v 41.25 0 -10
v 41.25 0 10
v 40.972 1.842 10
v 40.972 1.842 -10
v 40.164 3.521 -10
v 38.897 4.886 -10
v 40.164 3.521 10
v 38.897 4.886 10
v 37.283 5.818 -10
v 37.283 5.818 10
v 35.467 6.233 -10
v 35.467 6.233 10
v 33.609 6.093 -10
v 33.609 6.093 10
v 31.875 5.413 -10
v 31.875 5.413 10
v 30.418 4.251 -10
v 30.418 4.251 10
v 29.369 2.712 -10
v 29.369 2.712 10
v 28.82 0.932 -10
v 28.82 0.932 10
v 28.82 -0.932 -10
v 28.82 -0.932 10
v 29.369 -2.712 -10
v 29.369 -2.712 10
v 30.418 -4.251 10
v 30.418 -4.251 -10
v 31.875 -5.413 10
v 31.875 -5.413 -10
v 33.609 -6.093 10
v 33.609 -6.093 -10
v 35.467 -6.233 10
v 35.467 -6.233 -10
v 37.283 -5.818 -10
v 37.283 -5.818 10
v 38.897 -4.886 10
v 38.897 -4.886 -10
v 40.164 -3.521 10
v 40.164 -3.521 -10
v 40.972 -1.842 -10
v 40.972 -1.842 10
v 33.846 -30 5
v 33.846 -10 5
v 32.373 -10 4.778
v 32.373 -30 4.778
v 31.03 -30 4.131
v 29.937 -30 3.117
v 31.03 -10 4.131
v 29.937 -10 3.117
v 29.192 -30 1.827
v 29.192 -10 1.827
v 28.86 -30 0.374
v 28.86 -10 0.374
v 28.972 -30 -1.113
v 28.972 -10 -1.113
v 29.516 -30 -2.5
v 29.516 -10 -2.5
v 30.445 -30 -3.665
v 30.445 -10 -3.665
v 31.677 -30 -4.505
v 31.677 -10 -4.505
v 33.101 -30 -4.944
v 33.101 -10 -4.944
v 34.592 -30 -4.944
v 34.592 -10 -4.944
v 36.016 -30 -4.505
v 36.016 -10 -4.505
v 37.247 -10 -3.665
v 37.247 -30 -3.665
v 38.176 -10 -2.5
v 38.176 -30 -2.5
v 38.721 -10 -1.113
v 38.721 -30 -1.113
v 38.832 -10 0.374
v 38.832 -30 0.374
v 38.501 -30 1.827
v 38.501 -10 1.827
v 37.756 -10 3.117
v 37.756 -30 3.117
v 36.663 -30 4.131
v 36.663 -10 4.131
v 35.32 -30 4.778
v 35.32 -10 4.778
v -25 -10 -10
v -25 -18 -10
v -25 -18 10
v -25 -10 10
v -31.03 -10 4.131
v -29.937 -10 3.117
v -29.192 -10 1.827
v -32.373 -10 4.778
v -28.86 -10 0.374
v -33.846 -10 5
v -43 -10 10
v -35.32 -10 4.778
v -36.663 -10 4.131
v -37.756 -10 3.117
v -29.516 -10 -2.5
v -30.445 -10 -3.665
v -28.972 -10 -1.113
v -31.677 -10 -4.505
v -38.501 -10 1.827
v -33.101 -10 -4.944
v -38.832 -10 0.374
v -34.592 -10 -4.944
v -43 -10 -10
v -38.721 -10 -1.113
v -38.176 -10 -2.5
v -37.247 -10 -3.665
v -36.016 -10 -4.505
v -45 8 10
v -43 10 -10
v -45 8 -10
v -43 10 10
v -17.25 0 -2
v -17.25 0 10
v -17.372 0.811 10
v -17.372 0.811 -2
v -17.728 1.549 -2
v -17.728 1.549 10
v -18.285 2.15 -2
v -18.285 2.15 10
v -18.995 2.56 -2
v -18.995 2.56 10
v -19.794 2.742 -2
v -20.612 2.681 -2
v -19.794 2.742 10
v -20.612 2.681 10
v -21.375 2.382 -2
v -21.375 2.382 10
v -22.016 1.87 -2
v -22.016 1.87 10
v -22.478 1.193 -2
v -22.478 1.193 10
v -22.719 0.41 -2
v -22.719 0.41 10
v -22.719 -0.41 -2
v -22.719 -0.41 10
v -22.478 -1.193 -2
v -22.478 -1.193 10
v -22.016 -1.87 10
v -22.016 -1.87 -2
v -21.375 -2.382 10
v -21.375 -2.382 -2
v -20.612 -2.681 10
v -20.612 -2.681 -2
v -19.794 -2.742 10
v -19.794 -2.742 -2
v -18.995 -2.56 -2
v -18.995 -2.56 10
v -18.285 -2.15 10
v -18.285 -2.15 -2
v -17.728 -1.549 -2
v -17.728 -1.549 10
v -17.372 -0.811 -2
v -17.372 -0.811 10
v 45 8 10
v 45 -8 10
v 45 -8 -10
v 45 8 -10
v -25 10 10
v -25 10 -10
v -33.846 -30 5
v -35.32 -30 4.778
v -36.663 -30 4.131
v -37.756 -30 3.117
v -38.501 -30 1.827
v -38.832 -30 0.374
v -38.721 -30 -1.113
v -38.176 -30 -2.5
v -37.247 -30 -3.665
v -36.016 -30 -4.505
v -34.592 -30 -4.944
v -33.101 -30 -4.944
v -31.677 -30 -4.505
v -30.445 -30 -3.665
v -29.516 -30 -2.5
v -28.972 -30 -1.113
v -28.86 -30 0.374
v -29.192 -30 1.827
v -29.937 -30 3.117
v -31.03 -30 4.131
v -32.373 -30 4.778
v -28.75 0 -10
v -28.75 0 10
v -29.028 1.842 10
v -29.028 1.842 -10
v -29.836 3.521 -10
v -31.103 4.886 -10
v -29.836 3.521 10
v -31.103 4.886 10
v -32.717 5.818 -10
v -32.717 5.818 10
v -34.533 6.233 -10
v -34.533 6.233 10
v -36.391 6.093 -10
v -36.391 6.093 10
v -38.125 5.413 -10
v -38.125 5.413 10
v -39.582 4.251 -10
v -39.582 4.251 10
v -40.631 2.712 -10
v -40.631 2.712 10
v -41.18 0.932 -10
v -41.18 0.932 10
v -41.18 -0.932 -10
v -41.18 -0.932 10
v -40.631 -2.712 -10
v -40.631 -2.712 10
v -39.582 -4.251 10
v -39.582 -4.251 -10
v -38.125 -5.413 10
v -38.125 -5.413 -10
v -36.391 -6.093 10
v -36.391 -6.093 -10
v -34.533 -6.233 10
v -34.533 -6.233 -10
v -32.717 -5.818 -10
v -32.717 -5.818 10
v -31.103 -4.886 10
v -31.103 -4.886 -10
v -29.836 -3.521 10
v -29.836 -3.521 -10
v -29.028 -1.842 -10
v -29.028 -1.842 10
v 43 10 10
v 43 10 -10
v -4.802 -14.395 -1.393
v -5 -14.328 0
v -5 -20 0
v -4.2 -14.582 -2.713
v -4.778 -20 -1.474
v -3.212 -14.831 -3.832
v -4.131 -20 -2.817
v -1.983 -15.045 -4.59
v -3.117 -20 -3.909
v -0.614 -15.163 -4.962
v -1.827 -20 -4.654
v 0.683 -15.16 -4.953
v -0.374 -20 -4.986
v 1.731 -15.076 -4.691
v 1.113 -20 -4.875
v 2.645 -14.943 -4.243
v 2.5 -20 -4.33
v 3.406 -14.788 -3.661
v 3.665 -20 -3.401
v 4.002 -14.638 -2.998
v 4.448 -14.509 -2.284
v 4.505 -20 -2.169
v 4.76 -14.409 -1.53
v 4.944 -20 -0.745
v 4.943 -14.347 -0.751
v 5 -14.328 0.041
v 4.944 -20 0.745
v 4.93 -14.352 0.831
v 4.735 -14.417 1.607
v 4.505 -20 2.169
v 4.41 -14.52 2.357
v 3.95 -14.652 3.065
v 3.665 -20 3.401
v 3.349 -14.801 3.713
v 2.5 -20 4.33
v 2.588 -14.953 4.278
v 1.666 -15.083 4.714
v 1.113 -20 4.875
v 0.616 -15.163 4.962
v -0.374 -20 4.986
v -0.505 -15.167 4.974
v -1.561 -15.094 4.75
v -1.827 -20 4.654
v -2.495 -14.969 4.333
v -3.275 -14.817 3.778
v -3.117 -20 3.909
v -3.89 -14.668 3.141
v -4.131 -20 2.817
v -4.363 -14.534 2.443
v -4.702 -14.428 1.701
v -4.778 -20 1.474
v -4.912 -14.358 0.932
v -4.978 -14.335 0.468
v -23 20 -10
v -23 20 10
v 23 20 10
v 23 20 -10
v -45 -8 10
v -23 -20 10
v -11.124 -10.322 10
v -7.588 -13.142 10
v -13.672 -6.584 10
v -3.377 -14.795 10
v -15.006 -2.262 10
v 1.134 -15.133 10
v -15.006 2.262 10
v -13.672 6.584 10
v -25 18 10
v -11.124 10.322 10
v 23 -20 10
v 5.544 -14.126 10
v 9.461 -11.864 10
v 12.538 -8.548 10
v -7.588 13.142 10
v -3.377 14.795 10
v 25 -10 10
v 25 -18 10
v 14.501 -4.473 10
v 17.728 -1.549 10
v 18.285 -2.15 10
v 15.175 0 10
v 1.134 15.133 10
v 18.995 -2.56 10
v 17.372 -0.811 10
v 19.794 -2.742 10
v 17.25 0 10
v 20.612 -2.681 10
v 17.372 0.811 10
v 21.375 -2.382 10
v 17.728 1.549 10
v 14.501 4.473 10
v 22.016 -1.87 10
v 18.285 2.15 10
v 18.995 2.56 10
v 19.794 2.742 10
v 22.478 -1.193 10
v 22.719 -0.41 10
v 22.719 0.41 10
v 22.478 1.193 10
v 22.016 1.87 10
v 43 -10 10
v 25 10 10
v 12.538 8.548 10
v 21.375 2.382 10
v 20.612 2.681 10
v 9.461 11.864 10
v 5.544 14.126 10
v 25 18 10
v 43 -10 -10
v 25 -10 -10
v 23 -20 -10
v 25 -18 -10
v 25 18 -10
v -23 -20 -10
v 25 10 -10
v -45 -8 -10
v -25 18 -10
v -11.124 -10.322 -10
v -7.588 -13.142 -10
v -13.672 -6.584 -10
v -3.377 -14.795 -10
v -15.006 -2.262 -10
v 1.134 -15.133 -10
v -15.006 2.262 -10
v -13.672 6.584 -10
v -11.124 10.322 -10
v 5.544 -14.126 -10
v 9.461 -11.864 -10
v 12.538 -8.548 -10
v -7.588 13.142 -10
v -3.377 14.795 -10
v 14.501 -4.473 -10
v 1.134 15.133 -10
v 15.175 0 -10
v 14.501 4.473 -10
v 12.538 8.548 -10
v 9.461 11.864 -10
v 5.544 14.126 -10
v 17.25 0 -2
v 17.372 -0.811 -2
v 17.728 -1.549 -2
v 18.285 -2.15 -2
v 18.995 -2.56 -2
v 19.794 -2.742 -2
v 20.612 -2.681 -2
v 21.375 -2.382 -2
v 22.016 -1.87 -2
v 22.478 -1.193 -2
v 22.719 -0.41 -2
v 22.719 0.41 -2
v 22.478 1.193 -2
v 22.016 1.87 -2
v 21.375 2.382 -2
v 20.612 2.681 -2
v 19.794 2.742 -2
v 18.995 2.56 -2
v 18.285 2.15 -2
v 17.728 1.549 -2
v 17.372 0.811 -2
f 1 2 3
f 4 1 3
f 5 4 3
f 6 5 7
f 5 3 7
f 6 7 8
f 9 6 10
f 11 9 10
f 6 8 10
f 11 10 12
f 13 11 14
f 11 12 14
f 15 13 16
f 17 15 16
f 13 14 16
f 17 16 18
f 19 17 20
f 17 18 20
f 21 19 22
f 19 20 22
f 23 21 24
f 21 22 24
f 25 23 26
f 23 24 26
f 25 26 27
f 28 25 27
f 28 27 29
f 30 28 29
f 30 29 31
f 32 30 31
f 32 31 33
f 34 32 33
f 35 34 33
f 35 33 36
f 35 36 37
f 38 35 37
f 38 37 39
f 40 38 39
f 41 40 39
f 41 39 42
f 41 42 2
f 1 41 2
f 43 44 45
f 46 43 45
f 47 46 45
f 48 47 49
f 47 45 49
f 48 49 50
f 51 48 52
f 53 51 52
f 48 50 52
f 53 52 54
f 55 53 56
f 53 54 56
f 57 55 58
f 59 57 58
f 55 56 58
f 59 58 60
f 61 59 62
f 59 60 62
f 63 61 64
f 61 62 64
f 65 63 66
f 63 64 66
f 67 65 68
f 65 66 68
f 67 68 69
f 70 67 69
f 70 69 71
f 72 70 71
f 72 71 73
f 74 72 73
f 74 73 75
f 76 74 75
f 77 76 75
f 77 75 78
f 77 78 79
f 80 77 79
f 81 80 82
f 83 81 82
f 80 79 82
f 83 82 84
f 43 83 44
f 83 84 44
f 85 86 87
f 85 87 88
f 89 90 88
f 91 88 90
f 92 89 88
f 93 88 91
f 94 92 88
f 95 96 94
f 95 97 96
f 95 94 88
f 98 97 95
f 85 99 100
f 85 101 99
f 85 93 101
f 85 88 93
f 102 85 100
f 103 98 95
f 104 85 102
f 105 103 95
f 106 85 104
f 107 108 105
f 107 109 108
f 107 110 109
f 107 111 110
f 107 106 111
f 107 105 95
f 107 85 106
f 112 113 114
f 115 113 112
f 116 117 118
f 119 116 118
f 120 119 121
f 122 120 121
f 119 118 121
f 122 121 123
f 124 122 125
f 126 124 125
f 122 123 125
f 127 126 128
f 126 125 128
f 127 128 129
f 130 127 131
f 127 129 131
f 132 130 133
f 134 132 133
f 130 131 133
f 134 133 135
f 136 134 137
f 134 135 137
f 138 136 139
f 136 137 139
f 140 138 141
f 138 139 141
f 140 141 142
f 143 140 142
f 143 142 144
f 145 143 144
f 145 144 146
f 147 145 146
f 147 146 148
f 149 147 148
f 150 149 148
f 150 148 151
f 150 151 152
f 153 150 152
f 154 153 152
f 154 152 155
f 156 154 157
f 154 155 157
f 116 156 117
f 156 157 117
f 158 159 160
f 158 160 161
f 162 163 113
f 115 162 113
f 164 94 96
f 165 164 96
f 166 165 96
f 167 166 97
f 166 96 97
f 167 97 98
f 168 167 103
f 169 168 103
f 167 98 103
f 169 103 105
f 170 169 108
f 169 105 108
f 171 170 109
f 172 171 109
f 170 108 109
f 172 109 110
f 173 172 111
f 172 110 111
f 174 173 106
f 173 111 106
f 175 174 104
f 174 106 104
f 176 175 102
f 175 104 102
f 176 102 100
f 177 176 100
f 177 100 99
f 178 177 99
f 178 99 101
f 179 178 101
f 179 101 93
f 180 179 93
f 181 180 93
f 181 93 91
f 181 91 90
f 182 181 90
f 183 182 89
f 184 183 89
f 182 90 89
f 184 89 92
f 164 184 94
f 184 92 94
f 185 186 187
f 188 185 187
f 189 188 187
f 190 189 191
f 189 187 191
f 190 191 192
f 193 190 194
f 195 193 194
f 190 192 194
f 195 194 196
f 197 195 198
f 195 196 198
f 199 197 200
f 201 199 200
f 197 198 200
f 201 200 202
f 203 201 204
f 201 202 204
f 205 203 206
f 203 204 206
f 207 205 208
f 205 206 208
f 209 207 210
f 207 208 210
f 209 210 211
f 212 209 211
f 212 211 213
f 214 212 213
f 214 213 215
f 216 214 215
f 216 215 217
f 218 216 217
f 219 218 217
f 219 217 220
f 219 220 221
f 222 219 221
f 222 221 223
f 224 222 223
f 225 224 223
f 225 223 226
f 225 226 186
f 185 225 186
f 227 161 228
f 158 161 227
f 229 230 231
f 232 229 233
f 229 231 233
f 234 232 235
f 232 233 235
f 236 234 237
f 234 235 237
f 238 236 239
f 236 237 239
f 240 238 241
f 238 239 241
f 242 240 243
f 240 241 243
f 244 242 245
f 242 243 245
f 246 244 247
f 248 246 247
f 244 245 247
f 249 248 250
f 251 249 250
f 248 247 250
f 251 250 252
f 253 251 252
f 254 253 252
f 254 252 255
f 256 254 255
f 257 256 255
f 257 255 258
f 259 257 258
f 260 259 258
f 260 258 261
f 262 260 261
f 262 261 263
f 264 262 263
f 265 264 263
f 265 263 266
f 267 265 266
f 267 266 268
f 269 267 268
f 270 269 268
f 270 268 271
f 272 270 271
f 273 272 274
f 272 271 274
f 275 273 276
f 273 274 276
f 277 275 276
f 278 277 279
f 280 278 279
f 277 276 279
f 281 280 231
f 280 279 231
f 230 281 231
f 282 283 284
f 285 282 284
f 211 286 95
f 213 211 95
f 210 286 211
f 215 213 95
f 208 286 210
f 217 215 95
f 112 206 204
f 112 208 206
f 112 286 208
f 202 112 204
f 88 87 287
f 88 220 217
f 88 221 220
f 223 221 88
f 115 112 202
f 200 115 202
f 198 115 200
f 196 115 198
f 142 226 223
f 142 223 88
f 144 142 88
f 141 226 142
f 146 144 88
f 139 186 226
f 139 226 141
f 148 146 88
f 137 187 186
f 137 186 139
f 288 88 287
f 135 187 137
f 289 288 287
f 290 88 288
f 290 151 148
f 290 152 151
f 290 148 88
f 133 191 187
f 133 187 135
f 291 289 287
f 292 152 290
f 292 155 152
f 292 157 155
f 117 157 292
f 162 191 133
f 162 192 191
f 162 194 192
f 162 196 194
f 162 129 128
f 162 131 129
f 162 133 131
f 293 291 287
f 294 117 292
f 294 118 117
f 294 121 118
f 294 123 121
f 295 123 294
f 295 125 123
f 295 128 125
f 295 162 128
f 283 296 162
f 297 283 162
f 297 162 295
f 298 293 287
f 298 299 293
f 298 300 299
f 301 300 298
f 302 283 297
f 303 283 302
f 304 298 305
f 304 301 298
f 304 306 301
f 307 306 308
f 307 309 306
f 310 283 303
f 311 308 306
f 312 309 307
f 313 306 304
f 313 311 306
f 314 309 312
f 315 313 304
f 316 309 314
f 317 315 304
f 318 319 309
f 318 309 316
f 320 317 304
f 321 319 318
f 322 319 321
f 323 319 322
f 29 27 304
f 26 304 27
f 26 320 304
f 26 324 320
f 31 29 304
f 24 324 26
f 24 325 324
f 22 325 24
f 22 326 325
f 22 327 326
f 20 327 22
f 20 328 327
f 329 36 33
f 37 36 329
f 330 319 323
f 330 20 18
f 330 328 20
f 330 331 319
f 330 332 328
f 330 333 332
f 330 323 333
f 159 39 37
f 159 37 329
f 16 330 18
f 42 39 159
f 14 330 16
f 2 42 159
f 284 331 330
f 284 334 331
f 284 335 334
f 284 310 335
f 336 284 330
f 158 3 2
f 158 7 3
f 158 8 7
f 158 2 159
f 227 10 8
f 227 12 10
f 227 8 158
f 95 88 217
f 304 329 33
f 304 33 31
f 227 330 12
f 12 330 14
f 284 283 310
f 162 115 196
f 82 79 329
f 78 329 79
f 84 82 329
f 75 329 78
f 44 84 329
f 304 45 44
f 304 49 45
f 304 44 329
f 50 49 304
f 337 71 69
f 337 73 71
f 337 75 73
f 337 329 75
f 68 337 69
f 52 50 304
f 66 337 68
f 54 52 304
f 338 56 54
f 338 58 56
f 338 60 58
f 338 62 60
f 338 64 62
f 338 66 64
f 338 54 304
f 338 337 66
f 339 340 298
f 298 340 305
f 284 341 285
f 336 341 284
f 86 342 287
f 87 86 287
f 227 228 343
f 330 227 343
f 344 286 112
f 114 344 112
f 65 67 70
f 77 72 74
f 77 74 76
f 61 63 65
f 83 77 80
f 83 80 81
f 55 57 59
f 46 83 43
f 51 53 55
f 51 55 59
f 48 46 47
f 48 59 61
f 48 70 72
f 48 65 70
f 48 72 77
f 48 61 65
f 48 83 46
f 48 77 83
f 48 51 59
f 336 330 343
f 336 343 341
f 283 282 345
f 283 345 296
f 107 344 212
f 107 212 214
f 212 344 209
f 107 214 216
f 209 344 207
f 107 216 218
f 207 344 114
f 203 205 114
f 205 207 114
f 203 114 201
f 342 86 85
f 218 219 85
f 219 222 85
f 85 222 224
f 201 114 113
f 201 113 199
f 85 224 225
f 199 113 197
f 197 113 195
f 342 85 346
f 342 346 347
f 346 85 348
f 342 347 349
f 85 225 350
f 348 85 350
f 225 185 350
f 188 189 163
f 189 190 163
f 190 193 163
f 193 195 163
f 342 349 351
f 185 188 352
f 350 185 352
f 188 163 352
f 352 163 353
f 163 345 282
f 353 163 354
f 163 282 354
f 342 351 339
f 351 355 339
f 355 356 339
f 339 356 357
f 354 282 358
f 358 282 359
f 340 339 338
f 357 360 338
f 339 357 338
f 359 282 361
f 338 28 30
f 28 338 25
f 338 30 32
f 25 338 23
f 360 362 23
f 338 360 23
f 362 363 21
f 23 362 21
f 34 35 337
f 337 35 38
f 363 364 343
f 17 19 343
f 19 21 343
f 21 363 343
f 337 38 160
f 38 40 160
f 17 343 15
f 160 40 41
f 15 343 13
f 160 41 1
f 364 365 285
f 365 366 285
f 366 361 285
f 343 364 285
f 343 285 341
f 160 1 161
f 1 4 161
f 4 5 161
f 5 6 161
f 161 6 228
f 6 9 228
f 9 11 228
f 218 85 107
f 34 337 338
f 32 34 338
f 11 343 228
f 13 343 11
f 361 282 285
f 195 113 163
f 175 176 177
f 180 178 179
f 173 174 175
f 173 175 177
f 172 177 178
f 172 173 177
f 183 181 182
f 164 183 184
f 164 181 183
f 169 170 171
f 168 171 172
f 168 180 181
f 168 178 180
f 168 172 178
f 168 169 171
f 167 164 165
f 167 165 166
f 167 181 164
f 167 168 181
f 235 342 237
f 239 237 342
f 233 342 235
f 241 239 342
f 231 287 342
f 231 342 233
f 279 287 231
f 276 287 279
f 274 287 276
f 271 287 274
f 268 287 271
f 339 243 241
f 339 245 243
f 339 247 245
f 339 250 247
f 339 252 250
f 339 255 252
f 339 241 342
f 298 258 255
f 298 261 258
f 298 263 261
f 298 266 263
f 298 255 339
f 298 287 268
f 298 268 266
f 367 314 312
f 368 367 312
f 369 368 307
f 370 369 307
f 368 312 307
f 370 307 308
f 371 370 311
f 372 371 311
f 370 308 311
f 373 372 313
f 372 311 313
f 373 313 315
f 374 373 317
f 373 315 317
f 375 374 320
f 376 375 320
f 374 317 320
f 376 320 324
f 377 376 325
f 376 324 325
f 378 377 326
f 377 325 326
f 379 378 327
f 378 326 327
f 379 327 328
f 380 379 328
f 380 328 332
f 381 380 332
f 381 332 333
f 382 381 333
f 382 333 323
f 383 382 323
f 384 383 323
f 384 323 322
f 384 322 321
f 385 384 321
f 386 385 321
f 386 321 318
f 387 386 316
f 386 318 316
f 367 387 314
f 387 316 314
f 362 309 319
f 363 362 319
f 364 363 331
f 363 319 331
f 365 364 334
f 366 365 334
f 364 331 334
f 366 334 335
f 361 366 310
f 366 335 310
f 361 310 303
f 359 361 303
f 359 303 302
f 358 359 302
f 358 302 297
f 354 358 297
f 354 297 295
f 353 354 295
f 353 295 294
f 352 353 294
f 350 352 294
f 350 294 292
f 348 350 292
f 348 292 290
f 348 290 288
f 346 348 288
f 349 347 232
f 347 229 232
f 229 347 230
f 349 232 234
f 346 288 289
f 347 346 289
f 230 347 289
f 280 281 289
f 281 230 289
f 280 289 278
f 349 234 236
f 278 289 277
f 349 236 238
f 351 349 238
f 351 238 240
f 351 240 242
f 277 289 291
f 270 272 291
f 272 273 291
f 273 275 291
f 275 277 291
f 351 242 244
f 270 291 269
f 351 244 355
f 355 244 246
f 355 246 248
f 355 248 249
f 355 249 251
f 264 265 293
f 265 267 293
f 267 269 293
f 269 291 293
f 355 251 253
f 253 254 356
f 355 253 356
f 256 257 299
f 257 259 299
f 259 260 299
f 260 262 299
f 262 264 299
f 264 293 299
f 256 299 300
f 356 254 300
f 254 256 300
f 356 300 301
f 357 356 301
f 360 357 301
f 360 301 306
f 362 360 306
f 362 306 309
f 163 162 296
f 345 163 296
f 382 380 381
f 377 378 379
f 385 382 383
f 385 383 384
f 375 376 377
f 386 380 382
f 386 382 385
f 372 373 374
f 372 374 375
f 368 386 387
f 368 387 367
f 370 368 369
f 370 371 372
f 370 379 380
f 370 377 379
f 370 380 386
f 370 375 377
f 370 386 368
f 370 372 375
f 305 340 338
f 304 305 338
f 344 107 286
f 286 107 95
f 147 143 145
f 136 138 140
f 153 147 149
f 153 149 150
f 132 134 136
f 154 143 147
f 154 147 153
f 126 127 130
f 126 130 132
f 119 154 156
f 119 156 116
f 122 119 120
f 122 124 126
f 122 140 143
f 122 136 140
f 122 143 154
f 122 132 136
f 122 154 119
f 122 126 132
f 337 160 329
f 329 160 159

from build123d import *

# Parameters (mm, degrees)
SKETCH1_W                       = 90
SKETCH1_H                       = 40
BOSS_EXTRUDE1_DEPTH             = 20
SKETCH2_W                       = 20
SKETCH2_H                       = 10
CUT_EXTRUDE1_DEPTH              = 54.150729064
SKETCH3_W                       = 20
SKETCH3_H                       = 10
CUT_EXTRUDE2_DEPTH              = 54.150729064
SKETCH4_W                       = 20
SKETCH4_H                       = 10
CUT_EXTRUDE3_DEPTH              = 54.150729064
SKETCH5_W                       = 20
SKETCH5_H                       = 10
CUT_EXTRUDE4_DEPTH              = 54.150729064
F_5_0_5_DIAMETER_HOLE1_D        = 5
F_5_0_5_DIAMETER_HOLE1_DEPTH    = 12
M27_CLEARANCE_HOLE1_D           = 29.849192884
F_10_0_10_DIAMETER_HOLE1_REACH  = 63.033
F_10_0_10_DIAMETER_HOLE1_BORE_R = 5
F_12_0_12_DIAMETER_HOLE1_D      = 12
CHAMFER1_SIZE                   = 2
SKETCH18_R                      = 6.25
CUT_EXTRUDE6_DEPTH              = 100
SKETCH20_R                      = 15.175
CUT_EXTRUDE7_DEPTH              = 100
SKETCH21_R                      = 2.75
CUT_EXTRUDE8_DEPTH              = 12
SKETCH23_R                      = 5
BOSS_EXTRUDE2_DEPTH             = 20


with BuildPart() as part:
    # Sketch1 → Boss-Extrude1 (new body)
    with BuildSketch(Plane.XY.offset(10)):
        Rectangle(SKETCH1_W, SKETCH1_H)
    extrude(amount=-BOSS_EXTRUDE1_DEPTH)

    # Sketch2 → Cut-Extrude1 (cut, through all)
    with BuildSketch(Plane(origin=(0, 0, -10), x_dir=(-1, 0, 0), z_dir=(0, 0, -1))):
        with Locations((35, 15)):
            Rectangle(SKETCH2_W, SKETCH2_H)
    extrude(amount=-CUT_EXTRUDE1_DEPTH, mode=Mode.SUBTRACT)

    # Sketch3 → Cut-Extrude2 (cut, through all)
    with BuildSketch(Plane(origin=(0, 0, -10), x_dir=(-1, 0, 0), z_dir=(0, 0, -1))):
        with Locations((35, -15)):
            Rectangle(SKETCH3_W, SKETCH3_H)
    extrude(amount=-CUT_EXTRUDE2_DEPTH, mode=Mode.SUBTRACT)

    # Sketch4 → Cut-Extrude3 (cut, through all)
    with BuildSketch(Plane(origin=(0, 0, -10), x_dir=(-1, 0, 0), z_dir=(0, 0, -1))):
        with Locations((-35, -15)):
            Rectangle(SKETCH4_W, SKETCH4_H)
    extrude(amount=-CUT_EXTRUDE3_DEPTH, mode=Mode.SUBTRACT)

    # Sketch5 → Cut-Extrude4 (cut, through all)
    with BuildSketch(Plane(origin=(0, 0, -10), x_dir=(-1, 0, 0), z_dir=(0, 0, -1))):
        with Locations((-35, 15)):
            Rectangle(SKETCH5_W, SKETCH5_H)
    extrude(amount=-CUT_EXTRUDE4_DEPTH, mode=Mode.SUBTRACT)

    # Ø5.0 (5) Diameter Hole1
    with Locations(Plane.XY.offset(10)):
        with Locations((20, 0), (-20, 0)):
            Hole(F_5_0_5_DIAMETER_HOLE1_D / 2, depth=F_5_0_5_DIAMETER_HOLE1_DEPTH)

    # M27 Clearance Hole1 (through all)
    with Locations(Plane.XY.offset(10)):
        with Locations((0, 0)):
            Hole(M27_CLEARANCE_HOLE1_D / 2)

    # Ø10.0 (10) Diameter Hole1 bore → Ø10.0 (10) Diameter Hole1 (cut, up to next)
    with BuildSketch(Plane(origin=(0, -20, 0), x_dir=(-1, 0, 0), z_dir=(0, -1, 0)), mode=Mode.PRIVATE) as f_10_0_10_diameter_hole1_sk1:
        Circle(F_10_0_10_DIAMETER_HOLE1_BORE_R)
    f_10_0_10_diameter_hole1_tool1 = extrude(f_10_0_10_diameter_hole1_sk1.sketch, amount=-F_10_0_10_DIAMETER_HOLE1_REACH, mode=Mode.PRIVATE) & part.part
    add(f_10_0_10_diameter_hole1_tool1.solids().sort_by_distance((0, -20, 0))[0], mode=Mode.SUBTRACT)

    # Ø12.0 (12) Diameter Hole1 (through all)
    with Locations(Plane(origin=(0, 0, -10), x_dir=(-1, 0, 0), z_dir=(0, 0, -1))):
        with Locations((35, 0), (-35, 0)):
            Hole(F_12_0_12_DIAMETER_HOLE1_D / 2)

    # Chamfer1
    chamfer1_edges = [part.edges().sort_by_distance(p)[0] for p in [
        (-25, 20, 0),
        (-45, 10, 0),
        (-45, -10, 0),
        (-25, -20, 0),
        (25, -20, 0),
        (45, -10, 0),
        (45, 10, 0),
        (25, 20, 0),
    ]]
    chamfer(chamfer1_edges, length=CHAMFER1_SIZE)

    # Sketch18 → Cut-Extrude6 (cut)
    with BuildSketch(Plane.XY.offset(10)):
        with Locations((-35, 0)):
            Circle(SKETCH18_R)
        with Locations((35, 0)):
            Circle(SKETCH18_R)
    extrude(amount=-CUT_EXTRUDE6_DEPTH, mode=Mode.SUBTRACT)

    # Sketch20 → Cut-Extrude7 (cut)
    with BuildSketch(Plane.XY.offset(10)):
        Circle(SKETCH20_R)
    extrude(amount=-CUT_EXTRUDE7_DEPTH, mode=Mode.SUBTRACT)

    # Sketch21 → Cut-Extrude8 (cut)
    with BuildSketch(Plane.XY.offset(10)):
        with Locations((-20, 0)):
            Circle(SKETCH21_R)
        with Locations(Location((20, 0, 0), (0, 0, 180))):
            Circle(SKETCH21_R)
    extrude(amount=-CUT_EXTRUDE8_DEPTH, mode=Mode.SUBTRACT)

    # Sketch23 → Boss-Extrude2 (add)
    with BuildSketch(Plane.XZ.offset(10)):
        with Locations(Location((-33.846356211, 0, 0), (0, 0, 90))):
            Circle(SKETCH23_R)
        with Locations(Location((33.846356211, 0, 0), (0, 0, 90))):
            Circle(SKETCH23_R)
    extrude(amount=BOSS_EXTRUDE2_DEPTH)


solid = part.part
